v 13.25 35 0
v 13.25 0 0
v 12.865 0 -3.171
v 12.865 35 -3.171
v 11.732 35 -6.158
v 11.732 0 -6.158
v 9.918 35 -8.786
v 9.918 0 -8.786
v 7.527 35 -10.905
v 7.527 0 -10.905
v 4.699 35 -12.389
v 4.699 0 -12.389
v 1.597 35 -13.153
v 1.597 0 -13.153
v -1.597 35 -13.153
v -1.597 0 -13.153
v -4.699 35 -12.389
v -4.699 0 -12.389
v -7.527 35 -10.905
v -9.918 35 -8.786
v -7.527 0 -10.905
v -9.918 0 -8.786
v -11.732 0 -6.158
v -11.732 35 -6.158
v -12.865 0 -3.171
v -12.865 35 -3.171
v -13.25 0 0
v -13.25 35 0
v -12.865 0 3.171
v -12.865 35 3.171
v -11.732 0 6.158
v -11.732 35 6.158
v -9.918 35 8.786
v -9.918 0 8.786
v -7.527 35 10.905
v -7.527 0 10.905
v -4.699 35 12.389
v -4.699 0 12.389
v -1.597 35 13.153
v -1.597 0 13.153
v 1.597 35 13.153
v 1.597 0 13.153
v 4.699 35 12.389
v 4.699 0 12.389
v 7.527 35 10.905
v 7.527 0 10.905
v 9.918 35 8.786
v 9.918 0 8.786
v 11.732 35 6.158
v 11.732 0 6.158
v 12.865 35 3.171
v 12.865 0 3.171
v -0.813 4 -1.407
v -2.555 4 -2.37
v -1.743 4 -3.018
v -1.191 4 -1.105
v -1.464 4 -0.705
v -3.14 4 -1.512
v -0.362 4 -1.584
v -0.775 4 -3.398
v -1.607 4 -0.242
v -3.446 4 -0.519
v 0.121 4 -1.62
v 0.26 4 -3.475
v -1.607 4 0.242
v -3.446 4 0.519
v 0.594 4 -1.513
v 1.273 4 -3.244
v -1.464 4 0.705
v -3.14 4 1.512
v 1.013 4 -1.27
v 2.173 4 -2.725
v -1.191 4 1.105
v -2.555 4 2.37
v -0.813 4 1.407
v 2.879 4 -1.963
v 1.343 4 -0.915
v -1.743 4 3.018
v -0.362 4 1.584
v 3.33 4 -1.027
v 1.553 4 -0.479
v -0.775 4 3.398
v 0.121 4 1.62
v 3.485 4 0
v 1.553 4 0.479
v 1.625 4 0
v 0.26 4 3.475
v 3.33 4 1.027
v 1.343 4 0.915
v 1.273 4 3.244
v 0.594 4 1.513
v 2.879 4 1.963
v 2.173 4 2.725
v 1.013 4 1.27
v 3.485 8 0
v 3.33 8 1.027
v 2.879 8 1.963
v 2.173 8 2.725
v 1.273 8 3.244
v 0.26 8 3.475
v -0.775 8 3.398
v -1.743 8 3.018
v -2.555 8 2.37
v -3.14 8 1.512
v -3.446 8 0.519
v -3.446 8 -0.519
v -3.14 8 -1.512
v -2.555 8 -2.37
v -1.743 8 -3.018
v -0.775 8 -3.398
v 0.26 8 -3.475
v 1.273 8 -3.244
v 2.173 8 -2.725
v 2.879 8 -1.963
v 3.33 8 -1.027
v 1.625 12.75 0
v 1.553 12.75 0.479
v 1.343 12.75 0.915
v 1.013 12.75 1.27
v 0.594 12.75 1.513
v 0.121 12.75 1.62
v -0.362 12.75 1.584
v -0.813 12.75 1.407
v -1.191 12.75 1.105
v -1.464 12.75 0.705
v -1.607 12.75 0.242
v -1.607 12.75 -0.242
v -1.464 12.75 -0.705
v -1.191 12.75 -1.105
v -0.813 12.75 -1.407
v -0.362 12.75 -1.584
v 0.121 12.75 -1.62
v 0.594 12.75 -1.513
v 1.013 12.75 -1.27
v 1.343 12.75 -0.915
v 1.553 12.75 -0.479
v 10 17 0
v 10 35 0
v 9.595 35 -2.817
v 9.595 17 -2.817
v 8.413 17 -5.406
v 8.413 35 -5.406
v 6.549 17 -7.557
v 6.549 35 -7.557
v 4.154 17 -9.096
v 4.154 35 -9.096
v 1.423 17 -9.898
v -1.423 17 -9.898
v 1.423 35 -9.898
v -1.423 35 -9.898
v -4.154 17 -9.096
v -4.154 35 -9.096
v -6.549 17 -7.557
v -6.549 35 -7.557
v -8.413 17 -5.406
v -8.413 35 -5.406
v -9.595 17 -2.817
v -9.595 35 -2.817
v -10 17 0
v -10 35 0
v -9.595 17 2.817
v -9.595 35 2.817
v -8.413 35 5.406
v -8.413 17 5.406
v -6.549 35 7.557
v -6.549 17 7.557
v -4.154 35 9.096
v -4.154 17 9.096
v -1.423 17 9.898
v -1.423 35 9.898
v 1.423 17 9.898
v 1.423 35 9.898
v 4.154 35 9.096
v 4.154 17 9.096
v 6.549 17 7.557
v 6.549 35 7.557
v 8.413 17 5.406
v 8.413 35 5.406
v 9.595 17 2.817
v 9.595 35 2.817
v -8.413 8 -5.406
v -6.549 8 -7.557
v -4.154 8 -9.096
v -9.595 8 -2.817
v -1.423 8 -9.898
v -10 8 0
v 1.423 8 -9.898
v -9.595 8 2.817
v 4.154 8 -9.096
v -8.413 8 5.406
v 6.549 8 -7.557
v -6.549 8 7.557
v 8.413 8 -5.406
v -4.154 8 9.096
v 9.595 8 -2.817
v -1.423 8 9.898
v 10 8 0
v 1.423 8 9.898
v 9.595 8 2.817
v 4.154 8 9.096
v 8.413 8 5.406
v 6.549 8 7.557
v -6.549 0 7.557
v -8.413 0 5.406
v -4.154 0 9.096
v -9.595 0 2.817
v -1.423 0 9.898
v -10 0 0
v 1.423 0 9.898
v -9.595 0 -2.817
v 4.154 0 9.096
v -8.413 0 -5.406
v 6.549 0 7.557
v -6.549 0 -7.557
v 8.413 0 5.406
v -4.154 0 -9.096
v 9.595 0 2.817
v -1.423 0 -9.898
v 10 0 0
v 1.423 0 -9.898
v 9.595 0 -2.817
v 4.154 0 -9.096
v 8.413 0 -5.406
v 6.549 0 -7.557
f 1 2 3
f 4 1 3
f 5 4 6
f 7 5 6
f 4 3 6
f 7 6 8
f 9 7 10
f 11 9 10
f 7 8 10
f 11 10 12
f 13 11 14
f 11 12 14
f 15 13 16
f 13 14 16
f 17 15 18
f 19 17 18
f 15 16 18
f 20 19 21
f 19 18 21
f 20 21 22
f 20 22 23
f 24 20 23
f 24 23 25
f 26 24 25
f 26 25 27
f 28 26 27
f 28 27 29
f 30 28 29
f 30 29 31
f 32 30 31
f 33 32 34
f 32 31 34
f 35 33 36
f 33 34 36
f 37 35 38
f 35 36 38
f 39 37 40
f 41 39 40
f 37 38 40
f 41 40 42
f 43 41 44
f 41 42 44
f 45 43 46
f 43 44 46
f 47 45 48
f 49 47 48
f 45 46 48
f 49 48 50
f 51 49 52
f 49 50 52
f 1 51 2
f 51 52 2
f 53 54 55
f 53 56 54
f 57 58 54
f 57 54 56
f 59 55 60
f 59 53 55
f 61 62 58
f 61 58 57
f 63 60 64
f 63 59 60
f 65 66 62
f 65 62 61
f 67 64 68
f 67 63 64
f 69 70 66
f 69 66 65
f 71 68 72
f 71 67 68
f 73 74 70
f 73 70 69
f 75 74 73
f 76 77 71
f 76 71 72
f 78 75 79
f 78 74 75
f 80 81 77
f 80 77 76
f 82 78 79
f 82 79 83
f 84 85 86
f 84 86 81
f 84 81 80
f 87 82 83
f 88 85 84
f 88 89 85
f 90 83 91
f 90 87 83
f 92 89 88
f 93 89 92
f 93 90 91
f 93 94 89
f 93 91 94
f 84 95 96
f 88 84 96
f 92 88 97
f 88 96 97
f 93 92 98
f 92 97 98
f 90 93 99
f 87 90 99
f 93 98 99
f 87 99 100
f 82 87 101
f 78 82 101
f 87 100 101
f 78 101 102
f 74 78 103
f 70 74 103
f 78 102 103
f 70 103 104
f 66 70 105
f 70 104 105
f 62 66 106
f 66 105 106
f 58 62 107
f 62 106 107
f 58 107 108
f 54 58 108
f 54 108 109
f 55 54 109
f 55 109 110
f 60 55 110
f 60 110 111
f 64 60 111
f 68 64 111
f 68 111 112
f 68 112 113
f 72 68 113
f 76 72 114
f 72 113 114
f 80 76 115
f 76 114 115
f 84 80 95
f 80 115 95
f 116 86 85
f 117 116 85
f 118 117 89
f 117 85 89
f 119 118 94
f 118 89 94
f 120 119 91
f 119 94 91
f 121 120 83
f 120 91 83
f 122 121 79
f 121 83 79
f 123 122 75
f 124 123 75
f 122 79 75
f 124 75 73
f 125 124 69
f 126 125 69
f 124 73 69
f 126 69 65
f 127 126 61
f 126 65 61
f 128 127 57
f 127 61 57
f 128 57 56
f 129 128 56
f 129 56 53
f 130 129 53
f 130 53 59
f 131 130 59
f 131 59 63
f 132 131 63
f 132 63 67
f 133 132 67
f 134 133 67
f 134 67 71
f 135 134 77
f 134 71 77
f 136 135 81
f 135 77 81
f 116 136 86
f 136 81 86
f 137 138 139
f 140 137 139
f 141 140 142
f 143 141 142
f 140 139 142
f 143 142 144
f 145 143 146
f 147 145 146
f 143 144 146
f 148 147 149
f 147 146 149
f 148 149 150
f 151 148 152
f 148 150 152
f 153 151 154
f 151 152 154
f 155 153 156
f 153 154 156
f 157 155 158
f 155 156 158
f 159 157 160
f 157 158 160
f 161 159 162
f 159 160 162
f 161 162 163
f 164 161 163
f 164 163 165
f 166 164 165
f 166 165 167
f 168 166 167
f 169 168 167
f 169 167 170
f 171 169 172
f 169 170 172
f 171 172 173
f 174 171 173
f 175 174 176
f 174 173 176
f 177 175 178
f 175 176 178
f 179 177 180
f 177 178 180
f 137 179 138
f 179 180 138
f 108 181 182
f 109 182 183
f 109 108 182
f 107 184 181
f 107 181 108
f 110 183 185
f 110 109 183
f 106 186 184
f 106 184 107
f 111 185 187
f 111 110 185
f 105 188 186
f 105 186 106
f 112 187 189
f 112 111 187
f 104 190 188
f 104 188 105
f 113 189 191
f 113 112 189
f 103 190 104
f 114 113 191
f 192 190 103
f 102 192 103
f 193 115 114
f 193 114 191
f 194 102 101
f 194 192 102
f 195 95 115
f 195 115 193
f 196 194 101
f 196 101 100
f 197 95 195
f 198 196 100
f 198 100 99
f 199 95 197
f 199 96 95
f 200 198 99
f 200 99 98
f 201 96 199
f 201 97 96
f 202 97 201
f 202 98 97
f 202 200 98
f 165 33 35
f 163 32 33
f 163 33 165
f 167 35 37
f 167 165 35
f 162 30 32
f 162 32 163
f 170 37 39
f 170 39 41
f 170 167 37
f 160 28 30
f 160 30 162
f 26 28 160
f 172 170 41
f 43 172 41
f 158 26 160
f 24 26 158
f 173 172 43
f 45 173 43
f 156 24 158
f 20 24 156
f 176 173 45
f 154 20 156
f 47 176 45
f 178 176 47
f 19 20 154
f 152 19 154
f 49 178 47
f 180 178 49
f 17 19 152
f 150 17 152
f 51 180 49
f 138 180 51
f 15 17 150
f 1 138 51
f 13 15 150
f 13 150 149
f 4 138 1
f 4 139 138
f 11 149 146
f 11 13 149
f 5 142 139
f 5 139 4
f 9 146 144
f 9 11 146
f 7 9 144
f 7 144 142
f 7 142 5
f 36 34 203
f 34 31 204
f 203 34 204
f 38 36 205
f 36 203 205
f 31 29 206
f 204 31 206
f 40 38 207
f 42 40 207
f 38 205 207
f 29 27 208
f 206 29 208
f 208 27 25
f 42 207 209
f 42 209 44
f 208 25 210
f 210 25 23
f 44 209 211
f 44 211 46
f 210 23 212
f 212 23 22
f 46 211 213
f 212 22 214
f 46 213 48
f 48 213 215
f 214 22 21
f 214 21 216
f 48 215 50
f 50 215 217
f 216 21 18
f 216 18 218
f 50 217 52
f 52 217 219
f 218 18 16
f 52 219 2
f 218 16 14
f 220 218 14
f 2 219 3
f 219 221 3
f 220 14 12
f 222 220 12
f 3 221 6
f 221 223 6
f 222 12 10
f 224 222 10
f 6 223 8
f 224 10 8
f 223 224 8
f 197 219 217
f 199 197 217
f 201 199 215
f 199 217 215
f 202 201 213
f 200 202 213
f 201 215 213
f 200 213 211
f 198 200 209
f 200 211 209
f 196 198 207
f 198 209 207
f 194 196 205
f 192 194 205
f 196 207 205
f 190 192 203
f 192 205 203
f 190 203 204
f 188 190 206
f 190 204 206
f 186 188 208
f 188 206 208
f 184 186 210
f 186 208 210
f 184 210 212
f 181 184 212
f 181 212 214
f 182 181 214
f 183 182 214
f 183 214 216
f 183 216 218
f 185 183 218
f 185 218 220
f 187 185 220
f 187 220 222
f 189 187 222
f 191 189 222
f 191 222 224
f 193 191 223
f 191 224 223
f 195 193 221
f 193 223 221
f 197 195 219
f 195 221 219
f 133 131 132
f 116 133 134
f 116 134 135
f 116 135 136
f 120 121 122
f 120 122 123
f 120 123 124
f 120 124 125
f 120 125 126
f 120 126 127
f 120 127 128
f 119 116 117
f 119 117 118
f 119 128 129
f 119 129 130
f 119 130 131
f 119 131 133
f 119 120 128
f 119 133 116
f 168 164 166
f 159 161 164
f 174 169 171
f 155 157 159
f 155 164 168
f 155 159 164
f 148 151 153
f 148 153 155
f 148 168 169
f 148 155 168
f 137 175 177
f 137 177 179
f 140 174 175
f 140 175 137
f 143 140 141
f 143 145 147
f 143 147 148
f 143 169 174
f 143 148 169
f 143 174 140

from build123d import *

# Parameters (mm, degrees)
SKETCH1_R           = 13.25
BOSS_EXTRUDE1_DEPTH = 35
SKETCH7_R           = 10
CUT_EXTRUDE4_DEPTH  = 8
SKETCH10_R          = 3.485
BOSS_EXTRUDE3_DEPTH = 4
SKETCH11_R          = 1.625
CUT_EXTRUDE5_DEPTH  = 8.75
SKETCH13_R          = 10
CUT_EXTRUDE6_DEPTH  = 18


with BuildPart() as part:
    # Sketch1 → Boss-Extrude1 (new body)
    with BuildSketch(Plane(origin=(0, 0, 0), x_dir=(1, 0, 0), z_dir=(0, 1, 0))):
        Circle(SKETCH1_R)
    extrude(amount=BOSS_EXTRUDE1_DEPTH)

    # Sketch7 → Cut-Extrude4 (cut)
    with BuildSketch(Plane.XZ):
        Circle(SKETCH7_R)
    extrude(amount=-CUT_EXTRUDE4_DEPTH, mode=Mode.SUBTRACT)

    # Sketch10 → Boss-Extrude3 (add)
    with BuildSketch(Plane.XZ.offset(-8)):
        Circle(SKETCH10_R)
    extrude(amount=BOSS_EXTRUDE3_DEPTH)

    # Sketch11 → Cut-Extrude5 (cut)
    with BuildSketch(Plane.XZ.offset(-4)):
        Circle(SKETCH11_R)
    extrude(amount=-CUT_EXTRUDE5_DEPTH, mode=Mode.SUBTRACT)

    # Sketch13 → Cut-Extrude6 (cut)
    with BuildSketch(Plane(origin=(0, 35, 0), x_dir=(1, 0, 0), z_dir=(0, 1, 0))):
        Circle(SKETCH13_R)
    extrude(amount=-CUT_EXTRUDE6_DEPTH, mode=Mode.SUBTRACT)


solid = part.part
